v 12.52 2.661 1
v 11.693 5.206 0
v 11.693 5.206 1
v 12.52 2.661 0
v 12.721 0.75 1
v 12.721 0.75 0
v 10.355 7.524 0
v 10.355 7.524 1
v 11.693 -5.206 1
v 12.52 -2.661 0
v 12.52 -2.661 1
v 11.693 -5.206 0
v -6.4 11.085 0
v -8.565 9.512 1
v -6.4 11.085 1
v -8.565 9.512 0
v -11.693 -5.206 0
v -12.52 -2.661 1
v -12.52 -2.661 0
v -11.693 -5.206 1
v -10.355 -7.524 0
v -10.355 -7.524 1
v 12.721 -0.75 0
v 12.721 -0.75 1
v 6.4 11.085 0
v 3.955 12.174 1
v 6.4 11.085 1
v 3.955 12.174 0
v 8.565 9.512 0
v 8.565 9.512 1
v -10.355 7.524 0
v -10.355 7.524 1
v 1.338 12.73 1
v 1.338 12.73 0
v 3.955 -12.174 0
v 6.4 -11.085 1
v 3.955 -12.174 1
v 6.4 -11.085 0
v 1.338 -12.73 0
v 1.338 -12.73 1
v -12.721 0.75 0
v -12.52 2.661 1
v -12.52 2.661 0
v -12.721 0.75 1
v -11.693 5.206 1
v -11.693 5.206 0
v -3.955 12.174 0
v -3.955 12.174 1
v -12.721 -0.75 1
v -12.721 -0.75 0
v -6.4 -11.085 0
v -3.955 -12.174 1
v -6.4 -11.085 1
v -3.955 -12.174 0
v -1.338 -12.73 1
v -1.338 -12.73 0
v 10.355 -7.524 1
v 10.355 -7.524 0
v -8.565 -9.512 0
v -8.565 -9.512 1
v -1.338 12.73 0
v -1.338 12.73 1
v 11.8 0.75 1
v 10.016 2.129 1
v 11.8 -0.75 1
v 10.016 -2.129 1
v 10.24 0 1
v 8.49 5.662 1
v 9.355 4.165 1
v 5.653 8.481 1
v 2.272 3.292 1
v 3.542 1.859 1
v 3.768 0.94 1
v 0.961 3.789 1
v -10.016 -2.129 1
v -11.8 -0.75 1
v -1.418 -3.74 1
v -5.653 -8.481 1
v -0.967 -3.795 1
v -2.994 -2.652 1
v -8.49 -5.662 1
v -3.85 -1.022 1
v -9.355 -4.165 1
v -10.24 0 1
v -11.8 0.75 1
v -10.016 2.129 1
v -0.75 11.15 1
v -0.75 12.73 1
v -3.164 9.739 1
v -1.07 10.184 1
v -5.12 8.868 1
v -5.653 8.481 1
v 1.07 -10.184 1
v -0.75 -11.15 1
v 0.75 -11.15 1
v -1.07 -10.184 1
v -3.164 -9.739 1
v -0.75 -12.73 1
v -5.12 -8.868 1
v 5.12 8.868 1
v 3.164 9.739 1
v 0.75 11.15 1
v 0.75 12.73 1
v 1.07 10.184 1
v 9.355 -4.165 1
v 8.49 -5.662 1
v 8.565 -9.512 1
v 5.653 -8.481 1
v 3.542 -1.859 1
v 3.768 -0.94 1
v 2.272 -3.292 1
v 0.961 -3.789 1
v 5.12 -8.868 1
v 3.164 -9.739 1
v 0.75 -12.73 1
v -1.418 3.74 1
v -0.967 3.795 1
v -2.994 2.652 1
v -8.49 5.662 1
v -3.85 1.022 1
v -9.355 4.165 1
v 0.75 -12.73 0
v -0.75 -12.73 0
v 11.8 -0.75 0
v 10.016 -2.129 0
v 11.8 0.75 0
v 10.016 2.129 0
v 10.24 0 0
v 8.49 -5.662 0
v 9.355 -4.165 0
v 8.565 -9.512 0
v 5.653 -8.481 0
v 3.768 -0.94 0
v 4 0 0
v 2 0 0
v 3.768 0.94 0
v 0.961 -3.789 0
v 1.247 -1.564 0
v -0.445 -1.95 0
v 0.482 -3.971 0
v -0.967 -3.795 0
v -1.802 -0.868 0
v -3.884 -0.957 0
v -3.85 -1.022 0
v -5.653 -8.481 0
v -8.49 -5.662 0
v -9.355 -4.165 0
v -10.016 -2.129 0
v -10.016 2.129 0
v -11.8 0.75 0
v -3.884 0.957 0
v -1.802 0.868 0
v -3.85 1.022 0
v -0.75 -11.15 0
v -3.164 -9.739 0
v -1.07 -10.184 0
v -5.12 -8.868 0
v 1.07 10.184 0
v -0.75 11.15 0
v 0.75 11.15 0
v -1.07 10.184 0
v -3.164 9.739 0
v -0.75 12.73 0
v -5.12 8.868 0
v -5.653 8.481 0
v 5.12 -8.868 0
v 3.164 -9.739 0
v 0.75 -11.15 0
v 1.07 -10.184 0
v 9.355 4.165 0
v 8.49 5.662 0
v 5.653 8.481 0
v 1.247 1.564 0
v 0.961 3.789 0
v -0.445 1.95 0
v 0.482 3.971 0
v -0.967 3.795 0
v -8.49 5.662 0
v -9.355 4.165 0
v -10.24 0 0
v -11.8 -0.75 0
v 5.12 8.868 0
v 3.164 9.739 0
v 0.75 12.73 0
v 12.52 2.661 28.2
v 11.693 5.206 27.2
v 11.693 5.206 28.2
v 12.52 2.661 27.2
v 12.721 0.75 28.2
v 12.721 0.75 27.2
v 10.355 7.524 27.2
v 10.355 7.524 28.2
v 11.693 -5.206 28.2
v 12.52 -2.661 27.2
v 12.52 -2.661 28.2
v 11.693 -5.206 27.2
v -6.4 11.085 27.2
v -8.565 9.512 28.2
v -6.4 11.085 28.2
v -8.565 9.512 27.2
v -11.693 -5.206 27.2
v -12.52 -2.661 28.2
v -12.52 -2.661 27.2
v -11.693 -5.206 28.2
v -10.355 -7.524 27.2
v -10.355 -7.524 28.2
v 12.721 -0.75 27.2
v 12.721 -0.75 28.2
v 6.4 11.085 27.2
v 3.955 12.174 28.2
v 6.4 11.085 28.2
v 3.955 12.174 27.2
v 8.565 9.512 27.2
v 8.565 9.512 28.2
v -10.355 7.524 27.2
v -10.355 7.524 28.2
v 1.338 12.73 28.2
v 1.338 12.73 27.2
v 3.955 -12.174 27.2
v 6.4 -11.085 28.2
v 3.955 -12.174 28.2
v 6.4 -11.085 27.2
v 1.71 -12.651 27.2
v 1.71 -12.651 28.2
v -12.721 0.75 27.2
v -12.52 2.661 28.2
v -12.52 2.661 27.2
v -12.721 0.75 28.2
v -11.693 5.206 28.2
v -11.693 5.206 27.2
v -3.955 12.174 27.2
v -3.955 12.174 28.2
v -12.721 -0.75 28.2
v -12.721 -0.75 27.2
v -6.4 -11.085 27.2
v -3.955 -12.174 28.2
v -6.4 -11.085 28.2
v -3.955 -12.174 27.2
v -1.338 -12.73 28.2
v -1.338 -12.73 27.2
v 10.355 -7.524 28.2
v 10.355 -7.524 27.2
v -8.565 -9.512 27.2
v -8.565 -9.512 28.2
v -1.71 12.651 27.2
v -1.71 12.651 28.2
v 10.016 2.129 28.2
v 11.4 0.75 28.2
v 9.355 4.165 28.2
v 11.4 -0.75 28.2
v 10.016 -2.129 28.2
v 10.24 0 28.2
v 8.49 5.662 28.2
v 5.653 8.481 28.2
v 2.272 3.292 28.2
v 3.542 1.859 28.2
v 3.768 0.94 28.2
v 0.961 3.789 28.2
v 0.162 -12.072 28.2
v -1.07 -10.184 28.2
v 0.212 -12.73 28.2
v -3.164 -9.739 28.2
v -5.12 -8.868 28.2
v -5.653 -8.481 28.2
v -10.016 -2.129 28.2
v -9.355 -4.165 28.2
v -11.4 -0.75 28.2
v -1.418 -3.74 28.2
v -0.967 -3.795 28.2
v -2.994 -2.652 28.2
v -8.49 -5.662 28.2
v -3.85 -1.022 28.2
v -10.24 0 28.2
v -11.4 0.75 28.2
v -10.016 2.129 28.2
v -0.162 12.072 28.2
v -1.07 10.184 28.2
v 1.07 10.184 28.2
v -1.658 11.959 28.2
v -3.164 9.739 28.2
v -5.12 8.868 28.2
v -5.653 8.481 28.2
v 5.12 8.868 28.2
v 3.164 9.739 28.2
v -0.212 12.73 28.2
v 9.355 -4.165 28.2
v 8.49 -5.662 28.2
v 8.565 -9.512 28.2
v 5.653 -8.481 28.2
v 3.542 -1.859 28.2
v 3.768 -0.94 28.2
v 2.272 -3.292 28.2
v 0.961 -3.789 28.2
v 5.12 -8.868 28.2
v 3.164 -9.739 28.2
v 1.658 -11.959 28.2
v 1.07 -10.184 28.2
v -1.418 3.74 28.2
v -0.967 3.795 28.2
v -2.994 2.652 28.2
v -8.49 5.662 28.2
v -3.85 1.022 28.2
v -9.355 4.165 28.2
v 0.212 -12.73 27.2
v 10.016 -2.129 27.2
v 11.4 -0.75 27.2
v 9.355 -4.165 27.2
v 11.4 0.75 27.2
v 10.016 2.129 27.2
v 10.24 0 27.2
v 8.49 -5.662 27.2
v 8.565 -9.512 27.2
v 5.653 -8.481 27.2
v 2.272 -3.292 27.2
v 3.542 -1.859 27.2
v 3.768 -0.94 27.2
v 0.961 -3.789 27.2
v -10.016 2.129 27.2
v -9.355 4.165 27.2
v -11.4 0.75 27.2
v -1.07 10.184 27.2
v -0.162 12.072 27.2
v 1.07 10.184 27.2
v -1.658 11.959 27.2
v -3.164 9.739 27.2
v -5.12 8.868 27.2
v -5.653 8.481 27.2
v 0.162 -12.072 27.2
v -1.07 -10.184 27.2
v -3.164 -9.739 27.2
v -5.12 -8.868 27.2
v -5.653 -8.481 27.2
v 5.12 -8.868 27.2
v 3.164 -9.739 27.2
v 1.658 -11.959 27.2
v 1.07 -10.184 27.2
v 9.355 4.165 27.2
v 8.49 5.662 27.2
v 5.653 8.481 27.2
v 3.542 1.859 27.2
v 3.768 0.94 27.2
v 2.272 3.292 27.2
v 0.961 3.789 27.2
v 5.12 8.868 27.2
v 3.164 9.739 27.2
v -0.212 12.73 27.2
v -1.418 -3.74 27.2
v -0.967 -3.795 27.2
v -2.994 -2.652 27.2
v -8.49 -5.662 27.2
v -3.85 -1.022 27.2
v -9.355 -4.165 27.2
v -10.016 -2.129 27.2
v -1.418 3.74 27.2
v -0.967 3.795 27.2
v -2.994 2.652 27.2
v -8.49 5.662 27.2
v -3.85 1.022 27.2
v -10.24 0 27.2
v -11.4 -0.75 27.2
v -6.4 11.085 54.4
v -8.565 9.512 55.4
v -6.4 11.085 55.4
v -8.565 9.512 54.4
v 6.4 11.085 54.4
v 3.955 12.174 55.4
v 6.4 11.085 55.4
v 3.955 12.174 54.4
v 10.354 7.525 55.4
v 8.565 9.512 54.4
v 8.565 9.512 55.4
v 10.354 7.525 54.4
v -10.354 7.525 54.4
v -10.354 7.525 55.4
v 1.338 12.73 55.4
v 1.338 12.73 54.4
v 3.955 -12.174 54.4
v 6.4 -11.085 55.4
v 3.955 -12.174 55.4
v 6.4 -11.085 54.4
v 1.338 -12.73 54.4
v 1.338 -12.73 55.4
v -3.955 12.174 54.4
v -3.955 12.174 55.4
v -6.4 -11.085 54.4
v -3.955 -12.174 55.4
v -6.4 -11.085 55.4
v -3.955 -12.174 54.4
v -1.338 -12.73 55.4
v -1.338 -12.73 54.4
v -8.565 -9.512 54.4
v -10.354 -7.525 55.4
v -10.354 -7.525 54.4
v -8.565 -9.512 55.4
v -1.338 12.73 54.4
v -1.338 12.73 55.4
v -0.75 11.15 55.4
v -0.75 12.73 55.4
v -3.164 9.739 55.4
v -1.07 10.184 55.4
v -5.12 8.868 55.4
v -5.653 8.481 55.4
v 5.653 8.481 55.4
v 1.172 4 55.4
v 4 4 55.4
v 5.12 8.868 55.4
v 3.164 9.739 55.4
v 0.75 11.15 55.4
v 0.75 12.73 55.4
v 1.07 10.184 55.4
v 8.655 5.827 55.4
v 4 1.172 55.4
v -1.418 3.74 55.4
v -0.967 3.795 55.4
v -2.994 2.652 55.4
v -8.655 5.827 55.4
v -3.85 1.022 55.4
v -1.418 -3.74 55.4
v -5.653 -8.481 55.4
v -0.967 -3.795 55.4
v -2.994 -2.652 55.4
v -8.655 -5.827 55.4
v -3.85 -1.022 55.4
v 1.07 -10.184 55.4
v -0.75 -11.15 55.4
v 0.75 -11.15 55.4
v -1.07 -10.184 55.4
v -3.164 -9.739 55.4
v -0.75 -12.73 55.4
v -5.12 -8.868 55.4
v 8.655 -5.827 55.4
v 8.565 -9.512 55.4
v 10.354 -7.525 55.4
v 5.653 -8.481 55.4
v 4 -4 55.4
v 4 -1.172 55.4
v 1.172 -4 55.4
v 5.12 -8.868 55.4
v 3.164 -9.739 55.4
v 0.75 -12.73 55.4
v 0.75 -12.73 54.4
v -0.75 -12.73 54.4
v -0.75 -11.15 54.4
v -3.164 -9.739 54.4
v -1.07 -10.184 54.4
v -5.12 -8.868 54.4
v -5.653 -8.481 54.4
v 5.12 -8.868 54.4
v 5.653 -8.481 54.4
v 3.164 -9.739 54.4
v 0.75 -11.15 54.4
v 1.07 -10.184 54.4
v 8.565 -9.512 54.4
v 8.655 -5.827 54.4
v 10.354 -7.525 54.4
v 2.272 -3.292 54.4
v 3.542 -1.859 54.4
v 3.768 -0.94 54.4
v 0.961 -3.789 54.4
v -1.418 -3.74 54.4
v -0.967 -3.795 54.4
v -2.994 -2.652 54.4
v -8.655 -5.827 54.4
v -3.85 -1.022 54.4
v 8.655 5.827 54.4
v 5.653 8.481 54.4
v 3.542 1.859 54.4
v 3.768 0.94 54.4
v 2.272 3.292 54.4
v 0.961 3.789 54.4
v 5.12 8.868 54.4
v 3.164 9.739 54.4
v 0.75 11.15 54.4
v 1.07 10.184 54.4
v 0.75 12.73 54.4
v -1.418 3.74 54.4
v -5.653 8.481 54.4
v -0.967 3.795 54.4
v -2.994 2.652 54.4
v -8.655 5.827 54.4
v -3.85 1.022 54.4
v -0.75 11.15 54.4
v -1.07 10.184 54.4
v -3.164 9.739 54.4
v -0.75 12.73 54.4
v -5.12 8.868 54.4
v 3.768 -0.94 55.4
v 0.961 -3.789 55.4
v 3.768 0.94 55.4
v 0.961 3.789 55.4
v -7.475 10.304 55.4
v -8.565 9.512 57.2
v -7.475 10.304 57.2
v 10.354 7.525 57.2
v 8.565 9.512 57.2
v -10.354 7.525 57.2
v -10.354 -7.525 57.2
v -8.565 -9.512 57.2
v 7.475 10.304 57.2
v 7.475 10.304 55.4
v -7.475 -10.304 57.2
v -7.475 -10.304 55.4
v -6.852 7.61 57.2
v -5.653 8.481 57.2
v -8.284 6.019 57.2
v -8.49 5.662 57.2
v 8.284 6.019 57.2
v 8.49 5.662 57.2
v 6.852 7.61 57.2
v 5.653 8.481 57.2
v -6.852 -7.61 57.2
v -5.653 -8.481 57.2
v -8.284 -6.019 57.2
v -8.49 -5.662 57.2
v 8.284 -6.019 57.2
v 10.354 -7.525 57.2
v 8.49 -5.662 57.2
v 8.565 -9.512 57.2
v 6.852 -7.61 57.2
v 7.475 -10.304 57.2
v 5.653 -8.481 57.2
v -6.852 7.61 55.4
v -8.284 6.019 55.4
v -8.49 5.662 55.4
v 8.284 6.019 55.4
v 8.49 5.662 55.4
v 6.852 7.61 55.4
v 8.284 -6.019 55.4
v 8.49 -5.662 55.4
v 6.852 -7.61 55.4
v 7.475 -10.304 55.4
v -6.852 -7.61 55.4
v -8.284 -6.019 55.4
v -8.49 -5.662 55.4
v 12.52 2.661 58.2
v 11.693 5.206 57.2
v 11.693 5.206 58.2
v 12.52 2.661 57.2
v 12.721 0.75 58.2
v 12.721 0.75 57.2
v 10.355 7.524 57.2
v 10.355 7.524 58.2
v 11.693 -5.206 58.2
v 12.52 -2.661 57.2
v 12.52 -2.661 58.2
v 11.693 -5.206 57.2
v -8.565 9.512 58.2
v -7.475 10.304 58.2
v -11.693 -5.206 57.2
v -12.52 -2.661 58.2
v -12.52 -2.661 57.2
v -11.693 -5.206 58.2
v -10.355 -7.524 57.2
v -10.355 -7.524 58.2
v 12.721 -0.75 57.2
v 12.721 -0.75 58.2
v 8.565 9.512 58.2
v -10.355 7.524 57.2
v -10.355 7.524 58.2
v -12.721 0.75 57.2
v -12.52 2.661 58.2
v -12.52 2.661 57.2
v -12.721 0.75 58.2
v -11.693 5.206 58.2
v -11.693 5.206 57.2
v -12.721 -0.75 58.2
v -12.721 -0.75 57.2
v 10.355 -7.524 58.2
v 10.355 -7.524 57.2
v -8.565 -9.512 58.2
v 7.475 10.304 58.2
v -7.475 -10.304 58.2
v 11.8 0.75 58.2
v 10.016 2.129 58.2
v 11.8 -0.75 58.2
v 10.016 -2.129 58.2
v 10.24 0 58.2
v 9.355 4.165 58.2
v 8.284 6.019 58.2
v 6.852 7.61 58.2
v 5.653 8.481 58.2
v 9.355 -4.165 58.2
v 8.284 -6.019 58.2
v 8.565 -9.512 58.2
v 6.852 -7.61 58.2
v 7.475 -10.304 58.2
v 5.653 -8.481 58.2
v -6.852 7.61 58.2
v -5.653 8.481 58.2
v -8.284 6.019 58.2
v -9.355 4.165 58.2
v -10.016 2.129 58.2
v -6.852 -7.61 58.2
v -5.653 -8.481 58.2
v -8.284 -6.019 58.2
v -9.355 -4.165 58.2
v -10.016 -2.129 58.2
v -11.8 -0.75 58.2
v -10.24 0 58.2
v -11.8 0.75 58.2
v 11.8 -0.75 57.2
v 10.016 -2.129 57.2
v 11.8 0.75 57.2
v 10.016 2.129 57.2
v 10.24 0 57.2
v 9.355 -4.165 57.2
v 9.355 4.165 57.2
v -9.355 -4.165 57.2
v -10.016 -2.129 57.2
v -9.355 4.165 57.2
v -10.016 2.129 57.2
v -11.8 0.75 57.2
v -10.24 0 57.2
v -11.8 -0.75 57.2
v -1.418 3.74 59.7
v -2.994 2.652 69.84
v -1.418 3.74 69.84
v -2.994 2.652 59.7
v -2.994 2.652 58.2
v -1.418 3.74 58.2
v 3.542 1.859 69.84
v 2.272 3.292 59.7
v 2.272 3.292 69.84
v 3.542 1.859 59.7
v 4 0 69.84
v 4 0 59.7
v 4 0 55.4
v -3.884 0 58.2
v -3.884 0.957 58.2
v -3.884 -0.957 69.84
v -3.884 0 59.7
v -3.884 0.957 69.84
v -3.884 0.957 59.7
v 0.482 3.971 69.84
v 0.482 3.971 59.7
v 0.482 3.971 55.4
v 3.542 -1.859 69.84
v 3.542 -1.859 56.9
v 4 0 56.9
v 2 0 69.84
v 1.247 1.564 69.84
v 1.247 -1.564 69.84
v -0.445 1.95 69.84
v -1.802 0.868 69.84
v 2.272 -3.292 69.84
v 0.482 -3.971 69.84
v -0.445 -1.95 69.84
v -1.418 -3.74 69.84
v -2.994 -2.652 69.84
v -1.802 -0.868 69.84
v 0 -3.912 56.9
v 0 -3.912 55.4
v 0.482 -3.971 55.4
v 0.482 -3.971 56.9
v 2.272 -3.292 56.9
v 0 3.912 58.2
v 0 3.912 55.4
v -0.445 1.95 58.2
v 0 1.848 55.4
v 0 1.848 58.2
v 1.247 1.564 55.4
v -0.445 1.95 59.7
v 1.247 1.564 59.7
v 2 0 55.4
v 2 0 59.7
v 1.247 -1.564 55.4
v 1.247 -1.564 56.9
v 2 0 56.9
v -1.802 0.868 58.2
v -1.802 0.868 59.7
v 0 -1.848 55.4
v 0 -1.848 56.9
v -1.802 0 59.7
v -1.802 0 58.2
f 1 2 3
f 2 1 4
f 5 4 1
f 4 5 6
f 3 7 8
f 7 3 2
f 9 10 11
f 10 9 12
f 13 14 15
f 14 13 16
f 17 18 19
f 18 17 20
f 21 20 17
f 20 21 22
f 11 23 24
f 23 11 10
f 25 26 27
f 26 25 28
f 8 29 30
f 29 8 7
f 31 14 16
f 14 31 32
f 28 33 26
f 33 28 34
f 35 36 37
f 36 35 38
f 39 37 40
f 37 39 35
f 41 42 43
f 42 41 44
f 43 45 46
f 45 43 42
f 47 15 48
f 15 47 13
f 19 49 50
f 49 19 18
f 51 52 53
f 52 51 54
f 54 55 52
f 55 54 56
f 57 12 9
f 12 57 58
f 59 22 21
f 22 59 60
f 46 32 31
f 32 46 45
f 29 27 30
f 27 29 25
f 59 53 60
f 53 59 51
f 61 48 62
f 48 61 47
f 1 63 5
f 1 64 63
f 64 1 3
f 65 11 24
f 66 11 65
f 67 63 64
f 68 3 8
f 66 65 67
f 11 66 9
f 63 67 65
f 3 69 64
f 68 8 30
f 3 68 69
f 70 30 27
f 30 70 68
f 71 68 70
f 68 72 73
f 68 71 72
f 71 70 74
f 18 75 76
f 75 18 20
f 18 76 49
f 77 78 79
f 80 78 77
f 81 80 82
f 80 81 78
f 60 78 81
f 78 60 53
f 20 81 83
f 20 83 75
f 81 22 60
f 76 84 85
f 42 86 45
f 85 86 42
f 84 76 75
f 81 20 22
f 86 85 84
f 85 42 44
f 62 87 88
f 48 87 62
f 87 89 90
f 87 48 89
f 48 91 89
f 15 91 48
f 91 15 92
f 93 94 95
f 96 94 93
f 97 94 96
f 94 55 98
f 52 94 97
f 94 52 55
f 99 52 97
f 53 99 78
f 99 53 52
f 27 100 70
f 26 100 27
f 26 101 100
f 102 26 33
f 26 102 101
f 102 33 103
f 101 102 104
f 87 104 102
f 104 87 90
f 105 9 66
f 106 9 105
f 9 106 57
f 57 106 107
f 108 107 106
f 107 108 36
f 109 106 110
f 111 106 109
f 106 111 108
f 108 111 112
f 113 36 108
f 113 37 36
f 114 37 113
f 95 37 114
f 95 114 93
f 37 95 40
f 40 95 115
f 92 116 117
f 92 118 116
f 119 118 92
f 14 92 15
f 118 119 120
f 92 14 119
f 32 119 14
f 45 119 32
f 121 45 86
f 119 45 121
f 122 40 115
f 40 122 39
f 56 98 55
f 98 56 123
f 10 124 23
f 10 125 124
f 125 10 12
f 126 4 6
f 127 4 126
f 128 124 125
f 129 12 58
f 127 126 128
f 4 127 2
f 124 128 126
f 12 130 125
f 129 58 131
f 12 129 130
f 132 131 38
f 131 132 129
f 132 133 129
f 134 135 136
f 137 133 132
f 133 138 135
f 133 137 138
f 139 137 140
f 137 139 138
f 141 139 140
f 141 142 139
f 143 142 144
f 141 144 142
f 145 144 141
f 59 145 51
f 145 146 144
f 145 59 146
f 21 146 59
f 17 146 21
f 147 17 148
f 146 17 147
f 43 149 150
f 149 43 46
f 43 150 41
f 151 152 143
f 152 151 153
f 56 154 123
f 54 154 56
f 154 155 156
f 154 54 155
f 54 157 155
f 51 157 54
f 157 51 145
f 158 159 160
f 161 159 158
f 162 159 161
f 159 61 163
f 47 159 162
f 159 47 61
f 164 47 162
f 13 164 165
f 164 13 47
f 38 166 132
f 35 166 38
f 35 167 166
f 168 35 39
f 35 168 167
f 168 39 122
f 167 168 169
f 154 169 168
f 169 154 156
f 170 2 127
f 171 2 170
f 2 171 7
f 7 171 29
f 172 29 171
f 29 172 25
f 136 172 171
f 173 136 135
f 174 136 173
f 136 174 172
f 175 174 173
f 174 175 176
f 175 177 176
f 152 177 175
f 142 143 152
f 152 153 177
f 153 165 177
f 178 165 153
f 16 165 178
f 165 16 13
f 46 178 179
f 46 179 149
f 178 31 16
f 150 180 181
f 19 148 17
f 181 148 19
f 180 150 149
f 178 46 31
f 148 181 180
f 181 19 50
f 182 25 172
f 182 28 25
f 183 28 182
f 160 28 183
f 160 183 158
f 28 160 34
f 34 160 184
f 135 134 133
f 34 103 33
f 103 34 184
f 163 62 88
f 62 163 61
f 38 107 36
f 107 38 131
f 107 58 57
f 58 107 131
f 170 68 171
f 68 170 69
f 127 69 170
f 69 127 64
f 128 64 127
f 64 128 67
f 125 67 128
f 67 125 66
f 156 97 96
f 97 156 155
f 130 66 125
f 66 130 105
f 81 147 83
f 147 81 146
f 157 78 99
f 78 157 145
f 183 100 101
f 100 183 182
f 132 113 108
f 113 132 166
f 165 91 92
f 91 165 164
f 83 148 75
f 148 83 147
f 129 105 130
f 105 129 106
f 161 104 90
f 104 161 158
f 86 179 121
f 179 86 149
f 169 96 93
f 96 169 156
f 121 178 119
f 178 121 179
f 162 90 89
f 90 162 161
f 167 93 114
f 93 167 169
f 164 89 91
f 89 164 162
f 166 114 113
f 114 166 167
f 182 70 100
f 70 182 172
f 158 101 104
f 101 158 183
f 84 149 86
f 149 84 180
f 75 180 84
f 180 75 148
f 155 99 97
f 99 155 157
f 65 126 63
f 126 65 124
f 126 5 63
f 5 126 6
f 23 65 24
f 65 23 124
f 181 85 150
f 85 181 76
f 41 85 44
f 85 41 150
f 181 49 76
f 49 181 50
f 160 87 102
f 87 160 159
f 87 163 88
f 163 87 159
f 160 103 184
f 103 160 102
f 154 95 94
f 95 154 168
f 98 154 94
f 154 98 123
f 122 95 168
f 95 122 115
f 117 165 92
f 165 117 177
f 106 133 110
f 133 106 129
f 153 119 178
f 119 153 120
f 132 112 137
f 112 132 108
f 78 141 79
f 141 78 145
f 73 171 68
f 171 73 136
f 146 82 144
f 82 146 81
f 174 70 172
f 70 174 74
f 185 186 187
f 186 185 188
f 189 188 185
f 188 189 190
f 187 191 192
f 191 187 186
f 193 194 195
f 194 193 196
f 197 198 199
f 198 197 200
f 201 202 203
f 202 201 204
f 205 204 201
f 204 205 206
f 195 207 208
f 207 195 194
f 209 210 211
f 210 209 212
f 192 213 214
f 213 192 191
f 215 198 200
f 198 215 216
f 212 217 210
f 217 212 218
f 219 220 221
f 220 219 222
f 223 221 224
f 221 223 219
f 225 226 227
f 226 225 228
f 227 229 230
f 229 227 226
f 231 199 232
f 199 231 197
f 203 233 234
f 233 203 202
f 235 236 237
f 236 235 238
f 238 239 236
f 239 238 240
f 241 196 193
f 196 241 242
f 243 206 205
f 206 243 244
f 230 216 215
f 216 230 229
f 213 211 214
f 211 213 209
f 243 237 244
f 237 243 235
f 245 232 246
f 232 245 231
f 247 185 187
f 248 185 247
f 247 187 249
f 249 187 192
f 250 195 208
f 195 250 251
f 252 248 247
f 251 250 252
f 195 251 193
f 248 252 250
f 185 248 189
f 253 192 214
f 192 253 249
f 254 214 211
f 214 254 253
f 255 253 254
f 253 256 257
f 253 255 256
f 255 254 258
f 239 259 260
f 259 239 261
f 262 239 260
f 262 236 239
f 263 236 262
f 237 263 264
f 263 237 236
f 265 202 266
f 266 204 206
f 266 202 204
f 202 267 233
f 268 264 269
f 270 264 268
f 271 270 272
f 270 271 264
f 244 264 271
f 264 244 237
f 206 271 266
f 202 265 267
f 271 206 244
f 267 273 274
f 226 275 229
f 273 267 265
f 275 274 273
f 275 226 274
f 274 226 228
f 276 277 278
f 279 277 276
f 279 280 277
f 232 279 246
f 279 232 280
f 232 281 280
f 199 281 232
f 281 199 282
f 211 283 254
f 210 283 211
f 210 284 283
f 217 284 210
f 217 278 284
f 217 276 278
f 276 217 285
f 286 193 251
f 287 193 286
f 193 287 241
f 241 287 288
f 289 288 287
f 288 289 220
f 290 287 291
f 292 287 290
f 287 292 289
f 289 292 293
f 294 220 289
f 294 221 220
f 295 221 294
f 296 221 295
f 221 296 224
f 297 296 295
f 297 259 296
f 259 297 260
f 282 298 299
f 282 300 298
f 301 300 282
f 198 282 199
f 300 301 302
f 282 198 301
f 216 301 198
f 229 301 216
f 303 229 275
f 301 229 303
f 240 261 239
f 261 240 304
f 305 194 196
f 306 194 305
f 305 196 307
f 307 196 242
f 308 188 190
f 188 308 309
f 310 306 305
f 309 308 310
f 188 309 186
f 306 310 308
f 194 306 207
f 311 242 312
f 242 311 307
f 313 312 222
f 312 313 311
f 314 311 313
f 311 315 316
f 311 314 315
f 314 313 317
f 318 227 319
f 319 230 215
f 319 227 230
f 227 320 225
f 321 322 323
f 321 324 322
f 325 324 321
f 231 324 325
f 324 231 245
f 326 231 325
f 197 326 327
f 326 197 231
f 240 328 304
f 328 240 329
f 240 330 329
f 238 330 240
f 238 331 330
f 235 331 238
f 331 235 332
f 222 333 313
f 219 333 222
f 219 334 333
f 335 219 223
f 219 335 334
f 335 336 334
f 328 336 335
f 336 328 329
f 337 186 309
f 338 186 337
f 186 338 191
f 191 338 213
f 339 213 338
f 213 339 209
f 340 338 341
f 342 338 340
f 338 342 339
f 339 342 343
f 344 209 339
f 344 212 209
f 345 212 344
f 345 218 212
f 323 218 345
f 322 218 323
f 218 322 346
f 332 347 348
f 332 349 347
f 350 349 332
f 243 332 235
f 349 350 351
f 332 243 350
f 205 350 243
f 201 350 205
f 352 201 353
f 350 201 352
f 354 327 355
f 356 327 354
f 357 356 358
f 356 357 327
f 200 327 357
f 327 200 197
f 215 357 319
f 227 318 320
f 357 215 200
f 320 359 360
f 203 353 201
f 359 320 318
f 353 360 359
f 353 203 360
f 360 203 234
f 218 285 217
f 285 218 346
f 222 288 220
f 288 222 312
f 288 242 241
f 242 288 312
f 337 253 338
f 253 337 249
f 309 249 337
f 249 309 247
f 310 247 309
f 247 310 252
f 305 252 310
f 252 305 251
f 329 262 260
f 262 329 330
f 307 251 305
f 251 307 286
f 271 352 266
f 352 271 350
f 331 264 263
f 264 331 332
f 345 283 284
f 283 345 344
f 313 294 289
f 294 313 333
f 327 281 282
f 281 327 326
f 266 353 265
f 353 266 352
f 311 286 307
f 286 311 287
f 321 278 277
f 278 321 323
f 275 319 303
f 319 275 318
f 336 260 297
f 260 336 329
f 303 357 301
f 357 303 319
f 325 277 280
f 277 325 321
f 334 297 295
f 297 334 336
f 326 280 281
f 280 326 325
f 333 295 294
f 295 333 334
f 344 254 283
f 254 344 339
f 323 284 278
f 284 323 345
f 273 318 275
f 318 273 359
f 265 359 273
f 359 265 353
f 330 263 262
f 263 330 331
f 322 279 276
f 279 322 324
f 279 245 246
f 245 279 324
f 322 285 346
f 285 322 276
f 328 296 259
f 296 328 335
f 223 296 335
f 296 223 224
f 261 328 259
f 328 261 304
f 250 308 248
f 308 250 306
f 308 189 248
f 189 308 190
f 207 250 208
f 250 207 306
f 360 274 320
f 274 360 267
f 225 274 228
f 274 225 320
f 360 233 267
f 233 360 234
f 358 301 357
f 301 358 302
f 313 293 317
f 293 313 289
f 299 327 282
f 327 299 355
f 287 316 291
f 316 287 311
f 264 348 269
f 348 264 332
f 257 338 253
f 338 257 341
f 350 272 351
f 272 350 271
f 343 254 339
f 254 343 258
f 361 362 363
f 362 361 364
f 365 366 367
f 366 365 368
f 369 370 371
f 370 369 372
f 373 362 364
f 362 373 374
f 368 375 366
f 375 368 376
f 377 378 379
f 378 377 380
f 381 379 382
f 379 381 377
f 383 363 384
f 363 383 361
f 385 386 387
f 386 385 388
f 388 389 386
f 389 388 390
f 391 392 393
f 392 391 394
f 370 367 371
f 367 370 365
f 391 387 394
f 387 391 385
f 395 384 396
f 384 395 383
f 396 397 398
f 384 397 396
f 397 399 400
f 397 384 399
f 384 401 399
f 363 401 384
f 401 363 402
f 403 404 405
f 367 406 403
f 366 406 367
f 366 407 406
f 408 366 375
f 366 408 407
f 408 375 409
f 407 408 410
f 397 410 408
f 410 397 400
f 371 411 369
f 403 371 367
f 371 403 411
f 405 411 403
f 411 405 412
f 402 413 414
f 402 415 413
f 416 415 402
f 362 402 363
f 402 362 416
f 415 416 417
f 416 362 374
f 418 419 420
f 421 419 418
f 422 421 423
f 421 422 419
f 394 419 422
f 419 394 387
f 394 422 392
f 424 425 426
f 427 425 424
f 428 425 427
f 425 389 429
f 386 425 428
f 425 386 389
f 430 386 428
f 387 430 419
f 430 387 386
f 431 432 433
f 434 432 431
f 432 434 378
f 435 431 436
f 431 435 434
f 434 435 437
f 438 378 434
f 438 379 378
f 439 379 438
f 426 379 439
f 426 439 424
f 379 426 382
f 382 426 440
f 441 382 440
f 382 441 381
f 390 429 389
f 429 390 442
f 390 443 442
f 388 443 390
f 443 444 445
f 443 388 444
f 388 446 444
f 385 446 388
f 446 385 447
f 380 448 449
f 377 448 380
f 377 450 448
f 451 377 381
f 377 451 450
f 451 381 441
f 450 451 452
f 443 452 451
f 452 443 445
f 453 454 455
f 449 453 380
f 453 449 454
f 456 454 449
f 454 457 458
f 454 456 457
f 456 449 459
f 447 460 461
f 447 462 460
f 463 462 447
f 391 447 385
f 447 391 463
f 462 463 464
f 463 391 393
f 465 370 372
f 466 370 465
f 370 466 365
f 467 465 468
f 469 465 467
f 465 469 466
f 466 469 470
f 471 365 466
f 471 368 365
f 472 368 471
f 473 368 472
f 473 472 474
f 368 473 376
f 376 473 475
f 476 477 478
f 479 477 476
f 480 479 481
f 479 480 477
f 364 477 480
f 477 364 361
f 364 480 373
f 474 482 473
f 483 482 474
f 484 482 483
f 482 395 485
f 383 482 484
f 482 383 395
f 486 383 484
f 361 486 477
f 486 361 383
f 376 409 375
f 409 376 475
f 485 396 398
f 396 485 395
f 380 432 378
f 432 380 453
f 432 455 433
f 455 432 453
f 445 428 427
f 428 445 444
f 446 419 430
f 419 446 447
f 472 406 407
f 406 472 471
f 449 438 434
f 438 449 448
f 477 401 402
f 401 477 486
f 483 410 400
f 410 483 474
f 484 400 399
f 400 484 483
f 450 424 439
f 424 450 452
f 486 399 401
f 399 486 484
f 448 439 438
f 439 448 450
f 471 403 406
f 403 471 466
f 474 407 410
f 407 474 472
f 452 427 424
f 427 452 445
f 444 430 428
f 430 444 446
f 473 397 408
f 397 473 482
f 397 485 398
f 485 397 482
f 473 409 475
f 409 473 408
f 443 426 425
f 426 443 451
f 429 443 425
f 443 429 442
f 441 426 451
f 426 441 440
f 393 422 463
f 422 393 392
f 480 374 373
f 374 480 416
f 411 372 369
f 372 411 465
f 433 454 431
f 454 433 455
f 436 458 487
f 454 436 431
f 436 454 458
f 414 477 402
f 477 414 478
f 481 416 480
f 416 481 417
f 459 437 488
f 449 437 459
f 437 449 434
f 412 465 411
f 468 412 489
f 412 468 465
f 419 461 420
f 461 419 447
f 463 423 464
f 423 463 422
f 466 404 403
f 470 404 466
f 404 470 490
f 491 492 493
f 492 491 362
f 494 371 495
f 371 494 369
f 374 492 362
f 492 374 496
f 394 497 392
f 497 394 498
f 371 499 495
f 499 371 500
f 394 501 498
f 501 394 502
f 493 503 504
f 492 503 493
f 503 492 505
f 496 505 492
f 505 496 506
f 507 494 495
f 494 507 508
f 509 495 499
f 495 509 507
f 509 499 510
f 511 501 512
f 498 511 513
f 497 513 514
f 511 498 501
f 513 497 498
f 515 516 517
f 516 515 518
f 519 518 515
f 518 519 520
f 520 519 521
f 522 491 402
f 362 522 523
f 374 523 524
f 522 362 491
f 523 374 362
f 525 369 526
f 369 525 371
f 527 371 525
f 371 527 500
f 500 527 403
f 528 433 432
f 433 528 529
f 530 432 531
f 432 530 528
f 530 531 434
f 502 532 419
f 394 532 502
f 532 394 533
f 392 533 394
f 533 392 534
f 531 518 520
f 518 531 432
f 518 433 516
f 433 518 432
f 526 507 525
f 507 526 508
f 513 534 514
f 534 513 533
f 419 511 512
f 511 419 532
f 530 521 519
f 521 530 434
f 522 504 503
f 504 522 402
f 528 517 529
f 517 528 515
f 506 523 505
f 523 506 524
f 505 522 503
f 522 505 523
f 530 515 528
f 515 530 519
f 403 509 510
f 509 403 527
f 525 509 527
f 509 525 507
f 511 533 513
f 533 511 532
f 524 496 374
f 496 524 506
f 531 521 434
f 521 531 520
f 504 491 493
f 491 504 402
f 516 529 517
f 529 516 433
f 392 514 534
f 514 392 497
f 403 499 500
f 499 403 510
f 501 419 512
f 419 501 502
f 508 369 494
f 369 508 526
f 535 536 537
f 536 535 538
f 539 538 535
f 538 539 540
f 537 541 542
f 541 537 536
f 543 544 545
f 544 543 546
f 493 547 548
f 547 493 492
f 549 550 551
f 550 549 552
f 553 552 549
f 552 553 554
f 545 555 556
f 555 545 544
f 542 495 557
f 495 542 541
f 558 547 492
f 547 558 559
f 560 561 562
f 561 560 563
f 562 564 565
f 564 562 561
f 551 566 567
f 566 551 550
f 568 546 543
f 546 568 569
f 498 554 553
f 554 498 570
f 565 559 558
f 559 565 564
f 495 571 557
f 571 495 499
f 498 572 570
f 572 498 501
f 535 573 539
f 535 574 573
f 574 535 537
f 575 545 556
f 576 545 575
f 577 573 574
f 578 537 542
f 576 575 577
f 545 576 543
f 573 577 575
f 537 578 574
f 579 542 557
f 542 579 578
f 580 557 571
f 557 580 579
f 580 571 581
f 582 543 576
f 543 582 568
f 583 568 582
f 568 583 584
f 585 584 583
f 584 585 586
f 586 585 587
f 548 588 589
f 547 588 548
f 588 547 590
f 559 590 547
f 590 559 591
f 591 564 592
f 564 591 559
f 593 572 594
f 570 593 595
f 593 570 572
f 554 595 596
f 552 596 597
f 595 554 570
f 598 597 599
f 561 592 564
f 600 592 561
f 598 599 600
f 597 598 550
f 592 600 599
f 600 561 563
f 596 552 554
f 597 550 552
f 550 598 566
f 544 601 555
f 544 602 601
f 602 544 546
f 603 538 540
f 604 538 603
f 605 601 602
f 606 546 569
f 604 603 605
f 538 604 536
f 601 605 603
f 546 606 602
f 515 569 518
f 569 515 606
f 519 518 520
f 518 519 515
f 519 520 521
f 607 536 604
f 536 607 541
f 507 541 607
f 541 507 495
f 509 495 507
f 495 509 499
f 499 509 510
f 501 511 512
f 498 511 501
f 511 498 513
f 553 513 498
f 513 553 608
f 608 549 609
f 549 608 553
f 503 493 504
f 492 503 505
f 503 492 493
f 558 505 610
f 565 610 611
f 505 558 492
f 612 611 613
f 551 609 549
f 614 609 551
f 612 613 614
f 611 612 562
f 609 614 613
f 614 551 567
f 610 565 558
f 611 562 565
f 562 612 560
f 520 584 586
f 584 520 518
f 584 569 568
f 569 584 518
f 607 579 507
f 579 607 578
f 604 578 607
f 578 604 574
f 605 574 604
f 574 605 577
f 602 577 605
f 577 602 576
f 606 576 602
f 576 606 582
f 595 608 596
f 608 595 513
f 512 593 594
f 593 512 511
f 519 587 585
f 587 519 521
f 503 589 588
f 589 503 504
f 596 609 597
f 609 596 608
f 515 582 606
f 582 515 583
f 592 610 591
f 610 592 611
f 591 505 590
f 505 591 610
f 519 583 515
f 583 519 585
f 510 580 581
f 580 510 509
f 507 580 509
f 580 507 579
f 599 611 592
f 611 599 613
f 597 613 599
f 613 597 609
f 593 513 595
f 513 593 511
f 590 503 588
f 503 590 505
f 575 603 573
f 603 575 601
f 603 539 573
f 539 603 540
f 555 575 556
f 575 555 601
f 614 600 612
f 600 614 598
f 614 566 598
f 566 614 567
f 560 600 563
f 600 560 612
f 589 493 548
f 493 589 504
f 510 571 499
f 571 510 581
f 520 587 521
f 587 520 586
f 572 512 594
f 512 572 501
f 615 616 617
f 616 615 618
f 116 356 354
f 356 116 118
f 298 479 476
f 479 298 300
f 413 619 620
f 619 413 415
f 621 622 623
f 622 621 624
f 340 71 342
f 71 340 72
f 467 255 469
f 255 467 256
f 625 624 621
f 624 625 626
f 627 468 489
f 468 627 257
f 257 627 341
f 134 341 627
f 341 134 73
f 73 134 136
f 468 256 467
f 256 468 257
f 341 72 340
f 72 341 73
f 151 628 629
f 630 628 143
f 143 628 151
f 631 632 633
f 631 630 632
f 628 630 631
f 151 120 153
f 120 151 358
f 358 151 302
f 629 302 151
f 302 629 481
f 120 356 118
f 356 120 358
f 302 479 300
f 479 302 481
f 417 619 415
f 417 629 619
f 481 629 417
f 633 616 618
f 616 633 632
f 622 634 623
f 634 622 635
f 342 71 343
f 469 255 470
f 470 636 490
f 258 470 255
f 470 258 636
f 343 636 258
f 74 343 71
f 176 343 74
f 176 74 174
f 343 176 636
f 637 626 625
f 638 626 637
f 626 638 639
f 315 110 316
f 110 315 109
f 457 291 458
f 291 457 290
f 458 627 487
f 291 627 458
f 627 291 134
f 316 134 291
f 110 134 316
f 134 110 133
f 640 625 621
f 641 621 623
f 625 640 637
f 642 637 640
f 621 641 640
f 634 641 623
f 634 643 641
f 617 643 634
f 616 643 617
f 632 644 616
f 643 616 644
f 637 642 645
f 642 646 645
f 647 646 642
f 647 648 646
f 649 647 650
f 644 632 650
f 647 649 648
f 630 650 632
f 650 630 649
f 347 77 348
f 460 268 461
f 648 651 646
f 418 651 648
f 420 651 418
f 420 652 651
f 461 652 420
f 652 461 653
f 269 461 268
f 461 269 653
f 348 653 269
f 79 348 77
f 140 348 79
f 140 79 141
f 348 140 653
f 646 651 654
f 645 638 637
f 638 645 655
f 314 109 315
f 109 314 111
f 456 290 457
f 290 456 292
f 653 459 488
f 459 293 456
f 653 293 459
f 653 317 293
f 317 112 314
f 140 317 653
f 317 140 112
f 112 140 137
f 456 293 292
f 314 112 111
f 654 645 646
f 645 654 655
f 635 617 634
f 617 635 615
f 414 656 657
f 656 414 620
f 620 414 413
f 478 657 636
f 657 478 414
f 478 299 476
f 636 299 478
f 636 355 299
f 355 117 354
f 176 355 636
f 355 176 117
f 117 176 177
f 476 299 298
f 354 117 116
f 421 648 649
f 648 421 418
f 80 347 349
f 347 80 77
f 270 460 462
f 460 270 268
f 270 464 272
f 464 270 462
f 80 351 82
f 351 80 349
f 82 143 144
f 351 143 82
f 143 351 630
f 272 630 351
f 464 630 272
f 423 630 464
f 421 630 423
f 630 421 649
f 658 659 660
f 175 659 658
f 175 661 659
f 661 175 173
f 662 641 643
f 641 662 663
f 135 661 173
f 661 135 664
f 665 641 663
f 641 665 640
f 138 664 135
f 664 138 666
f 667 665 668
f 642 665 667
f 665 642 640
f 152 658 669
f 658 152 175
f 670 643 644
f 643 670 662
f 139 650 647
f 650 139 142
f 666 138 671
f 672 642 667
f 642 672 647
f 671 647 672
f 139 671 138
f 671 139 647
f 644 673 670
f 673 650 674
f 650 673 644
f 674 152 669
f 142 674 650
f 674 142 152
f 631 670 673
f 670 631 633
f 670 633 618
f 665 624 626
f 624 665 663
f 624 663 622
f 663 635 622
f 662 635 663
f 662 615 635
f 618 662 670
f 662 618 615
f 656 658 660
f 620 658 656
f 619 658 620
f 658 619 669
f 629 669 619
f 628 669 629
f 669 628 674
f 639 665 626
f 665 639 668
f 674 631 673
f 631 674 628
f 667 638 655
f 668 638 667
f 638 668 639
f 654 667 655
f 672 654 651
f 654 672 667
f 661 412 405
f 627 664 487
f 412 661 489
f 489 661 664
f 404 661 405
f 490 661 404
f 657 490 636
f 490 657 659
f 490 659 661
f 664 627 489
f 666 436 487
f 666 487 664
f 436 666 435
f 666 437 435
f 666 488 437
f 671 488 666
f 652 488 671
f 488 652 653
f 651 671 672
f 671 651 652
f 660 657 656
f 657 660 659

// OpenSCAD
// Values from https://jcoppens.com/ant/qfh/calc.en.php
// remember to enter the proper bending radius and wire diameter

// Frequency: 1700
// Turns: 0.5
// Length: 1
// Bend: 1
// Wire: 1.5
// W/h: 0.44

// Larger loop
H1=58.2;    // Antenna height, center to center of wire
Di1=24.1;   // Internal diameter
D1=25.6;    // Horizontal separator
Dc1=23.6;   // Compensated horiz. separation
// Smaller loop
H2=55.4;    // Antenna height
Di2=22.8;   // Internal diameter
D2=24.3;    // Horizontal separator
Dc2=22.3;   // Compensated horiz. separator

thickness=1;  // thickness of the support rings
coax=4;       // coax diameter, inside center cylinder
ccyl=8;       // center cylinder diameter
wire=1.5;     // wire diameter
aheight=max(H1,H2)*1.2; // add 20% length to the centre support

// D1 angle compensation for the middle ring
//mcomp=H2/H1*90-90;      // RH - LHCP
mcomp=90-H2/H1*90;      // LH - RHCP

// Note: the former is built upside down due to the top being flat

difference(){
    union(){
        cylinder(aheight, d=ccyl);
        // top ring
        union(){
            rotate([0, 0, 45])
                translate([-ccyl/4, -max(D1,D2)*0.4, 0])
                    cube([ccyl/2, max(D1,D2)*0.8, thickness]);
            rotate([0, 0, 135])
                translate([-ccyl/4, -max(D1,D2)*0.4, 0])
                    cube([ccyl/2, max(D1,D2)*0.8, thickness]);
            difference(){
                cylinder(thickness, d=max(D1,D2));
                translate([0, 0, -1])
                    cylinder(thickness+2, d=max(D1,D2)*0.8);
                rotate([0, 0, 0])
                    translate([Dc1/2, -wire/2, -1])
                        cube([wire*3, wire, thickness+2]);
                rotate([0, 0, 180])
                    translate([Dc1/2, -wire/2, -1])
                        cube([wire*3, wire, thickness+2]);
                rotate([0, 0, 90])
                    translate([Dc2/2, -wire/2, -1])
                        cube([wire*3, wire, thickness+2]);
                rotate([0, 0, 270])
                    translate([Dc2/2, -wire/2, -1])
                        cube([wire*3, wire, thickness+2]);
            }
        }

        // middle ring, placed for D2, D1 angle compensated
        translate([0,0,H2/2-thickness/2]){
            union(){
                rotate([0, 0, 45])
                    translate([-ccyl/4, -max(D1,D2)*0.4, 0])
                        cube([ccyl/2, max(D1,D2)*0.8, thickness]);
                rotate([0, 0, 135])
                    translate([-ccyl/4, -max(D1,D2)*0.4, 0])
                        cube([ccyl/2, max(D1,D2)*0.8, thickness]);
                difference(){
                    cylinder(thickness, d=max(D1,D2));
                    translate([0, 0, -1])
                        cylinder(thickness + 2, d=max(D1,D2)*0.8);
                rotate([0, 0, 90+mcomp])
                    translate([Di1/2, -wire/2, -1])
                        cube([wire*3, wire, thickness+2]);
                rotate([0, 0, 270+mcomp])
                    translate([Di1/2, -wire/2, -1])
                        cube([wire*3, wire, thickness+2]);
                rotate([0, 0, 0])
                    translate([Di2/2, -wire/2, -1])
                        cube([wire*3, wire, thickness+2]);
                rotate([0, 0, 180])
                    translate([Di2/2, -wire/2, -1])
                        cube([wire*3, wire, thickness+2]);
                }
            }
        }

        // bottom ring small
        translate([0,0,H2-thickness]){
            union(){
                rotate([0, 0, 45])
                    translate([-ccyl/4, -max(D1,D2)*0.4, 0])
                        cube([ccyl/2, max(D1,D2)*0.8, thickness]);
                rotate([0, 0, 135])
                    translate([-ccyl/4, -max(D1,D2)*0.4, 0])
                        cube([ccyl/2, max(D1,D2)*0.8, thickness]);
                difference(){
                    cylinder(thickness, d=max(D1,D2));
                    translate([0, 0, -1])
                        cylinder(thickness + 2, d=max(D1,D2)*0.8);
                    rotate([0, 0, 90])
                        translate([Dc2/2, -wire/2, -1])
                            cube([wire*3, wire, thickness+2]);
                    rotate([0, 0, 270])
                        translate([Dc2/2, -wire/2, -1])
                            cube([wire*3, wire, thickness+2]);
                    rotate([0, 0, 135])
                        translate([ccyl/4, ccyl/4, -1])
                            cube([D1/2, D1/2, thickness+2]);
                    rotate([0, 0, 315])
                        translate([ccyl/4, ccyl/4, -1])
                            cube([D1/2, D1/2, thickness+2]);
                }
            }
        }
        
        // link between bottom rings
        translate([0,0,(H1+H2)/2-thickness/2]){
            intersection(){
                difference(){
                    cylinder(H1-H2-thickness, d=max(D1,D2), center = true);
                    translate([0, 0, -1])
                        cylinder(thickness + 2, d=max(D1,D2)*0.8);
                }
                union(){
                    rotate([0, 0, 45])
                        cube([ccyl/2, max(D1, D2), H1-H2-thickness], center = true);
                    rotate([0, 0, 135])
                        cube([ccyl/2, max(D1, D2), H1-H2-thickness], center = true);
                    }
                }
            }

        // bottom ring large
        translate([0,0,H1-thickness]){
            difference(){
                cylinder(thickness, d=max(D1,D2));
                translate([0, 0, -1])
                    cylinder(thickness + 2, d=max(D1,D2)*0.8);
                rotate([0, 0, 0])
                    translate([Dc1/2, -wire/2, -1])
                        cube([wire*3, wire, thickness+2]);
                rotate([0, 0, 180])
                    translate([Dc1/2, -wire/2, -1])
                        cube([wire*3, wire, thickness+2]);
                rotate([0, 0, 45])
                    translate([ccyl/4, ccyl/4, -1])
                        cube([D1/2, D1/2, thickness+2]);
                rotate([0, 0, 225])
                    translate([ccyl/4, ccyl/4, -1])
                        cube([D1/2, D1/2, thickness+2]);
            }
        }
    }
    translate([0, 0, -1])
        cylinder(aheight+2, d=coax);
    translate([-ccyl/2, 0, H1])
        cube([ccyl, ccyl/2, wire]);
    translate([0, -ccyl/2, H2])
        cube([ccyl/2, ccyl, wire]);
    translate([0, 0, H2])
        cube([ccyl/2, ccyl/2, H1-H2+thickness]);
}
